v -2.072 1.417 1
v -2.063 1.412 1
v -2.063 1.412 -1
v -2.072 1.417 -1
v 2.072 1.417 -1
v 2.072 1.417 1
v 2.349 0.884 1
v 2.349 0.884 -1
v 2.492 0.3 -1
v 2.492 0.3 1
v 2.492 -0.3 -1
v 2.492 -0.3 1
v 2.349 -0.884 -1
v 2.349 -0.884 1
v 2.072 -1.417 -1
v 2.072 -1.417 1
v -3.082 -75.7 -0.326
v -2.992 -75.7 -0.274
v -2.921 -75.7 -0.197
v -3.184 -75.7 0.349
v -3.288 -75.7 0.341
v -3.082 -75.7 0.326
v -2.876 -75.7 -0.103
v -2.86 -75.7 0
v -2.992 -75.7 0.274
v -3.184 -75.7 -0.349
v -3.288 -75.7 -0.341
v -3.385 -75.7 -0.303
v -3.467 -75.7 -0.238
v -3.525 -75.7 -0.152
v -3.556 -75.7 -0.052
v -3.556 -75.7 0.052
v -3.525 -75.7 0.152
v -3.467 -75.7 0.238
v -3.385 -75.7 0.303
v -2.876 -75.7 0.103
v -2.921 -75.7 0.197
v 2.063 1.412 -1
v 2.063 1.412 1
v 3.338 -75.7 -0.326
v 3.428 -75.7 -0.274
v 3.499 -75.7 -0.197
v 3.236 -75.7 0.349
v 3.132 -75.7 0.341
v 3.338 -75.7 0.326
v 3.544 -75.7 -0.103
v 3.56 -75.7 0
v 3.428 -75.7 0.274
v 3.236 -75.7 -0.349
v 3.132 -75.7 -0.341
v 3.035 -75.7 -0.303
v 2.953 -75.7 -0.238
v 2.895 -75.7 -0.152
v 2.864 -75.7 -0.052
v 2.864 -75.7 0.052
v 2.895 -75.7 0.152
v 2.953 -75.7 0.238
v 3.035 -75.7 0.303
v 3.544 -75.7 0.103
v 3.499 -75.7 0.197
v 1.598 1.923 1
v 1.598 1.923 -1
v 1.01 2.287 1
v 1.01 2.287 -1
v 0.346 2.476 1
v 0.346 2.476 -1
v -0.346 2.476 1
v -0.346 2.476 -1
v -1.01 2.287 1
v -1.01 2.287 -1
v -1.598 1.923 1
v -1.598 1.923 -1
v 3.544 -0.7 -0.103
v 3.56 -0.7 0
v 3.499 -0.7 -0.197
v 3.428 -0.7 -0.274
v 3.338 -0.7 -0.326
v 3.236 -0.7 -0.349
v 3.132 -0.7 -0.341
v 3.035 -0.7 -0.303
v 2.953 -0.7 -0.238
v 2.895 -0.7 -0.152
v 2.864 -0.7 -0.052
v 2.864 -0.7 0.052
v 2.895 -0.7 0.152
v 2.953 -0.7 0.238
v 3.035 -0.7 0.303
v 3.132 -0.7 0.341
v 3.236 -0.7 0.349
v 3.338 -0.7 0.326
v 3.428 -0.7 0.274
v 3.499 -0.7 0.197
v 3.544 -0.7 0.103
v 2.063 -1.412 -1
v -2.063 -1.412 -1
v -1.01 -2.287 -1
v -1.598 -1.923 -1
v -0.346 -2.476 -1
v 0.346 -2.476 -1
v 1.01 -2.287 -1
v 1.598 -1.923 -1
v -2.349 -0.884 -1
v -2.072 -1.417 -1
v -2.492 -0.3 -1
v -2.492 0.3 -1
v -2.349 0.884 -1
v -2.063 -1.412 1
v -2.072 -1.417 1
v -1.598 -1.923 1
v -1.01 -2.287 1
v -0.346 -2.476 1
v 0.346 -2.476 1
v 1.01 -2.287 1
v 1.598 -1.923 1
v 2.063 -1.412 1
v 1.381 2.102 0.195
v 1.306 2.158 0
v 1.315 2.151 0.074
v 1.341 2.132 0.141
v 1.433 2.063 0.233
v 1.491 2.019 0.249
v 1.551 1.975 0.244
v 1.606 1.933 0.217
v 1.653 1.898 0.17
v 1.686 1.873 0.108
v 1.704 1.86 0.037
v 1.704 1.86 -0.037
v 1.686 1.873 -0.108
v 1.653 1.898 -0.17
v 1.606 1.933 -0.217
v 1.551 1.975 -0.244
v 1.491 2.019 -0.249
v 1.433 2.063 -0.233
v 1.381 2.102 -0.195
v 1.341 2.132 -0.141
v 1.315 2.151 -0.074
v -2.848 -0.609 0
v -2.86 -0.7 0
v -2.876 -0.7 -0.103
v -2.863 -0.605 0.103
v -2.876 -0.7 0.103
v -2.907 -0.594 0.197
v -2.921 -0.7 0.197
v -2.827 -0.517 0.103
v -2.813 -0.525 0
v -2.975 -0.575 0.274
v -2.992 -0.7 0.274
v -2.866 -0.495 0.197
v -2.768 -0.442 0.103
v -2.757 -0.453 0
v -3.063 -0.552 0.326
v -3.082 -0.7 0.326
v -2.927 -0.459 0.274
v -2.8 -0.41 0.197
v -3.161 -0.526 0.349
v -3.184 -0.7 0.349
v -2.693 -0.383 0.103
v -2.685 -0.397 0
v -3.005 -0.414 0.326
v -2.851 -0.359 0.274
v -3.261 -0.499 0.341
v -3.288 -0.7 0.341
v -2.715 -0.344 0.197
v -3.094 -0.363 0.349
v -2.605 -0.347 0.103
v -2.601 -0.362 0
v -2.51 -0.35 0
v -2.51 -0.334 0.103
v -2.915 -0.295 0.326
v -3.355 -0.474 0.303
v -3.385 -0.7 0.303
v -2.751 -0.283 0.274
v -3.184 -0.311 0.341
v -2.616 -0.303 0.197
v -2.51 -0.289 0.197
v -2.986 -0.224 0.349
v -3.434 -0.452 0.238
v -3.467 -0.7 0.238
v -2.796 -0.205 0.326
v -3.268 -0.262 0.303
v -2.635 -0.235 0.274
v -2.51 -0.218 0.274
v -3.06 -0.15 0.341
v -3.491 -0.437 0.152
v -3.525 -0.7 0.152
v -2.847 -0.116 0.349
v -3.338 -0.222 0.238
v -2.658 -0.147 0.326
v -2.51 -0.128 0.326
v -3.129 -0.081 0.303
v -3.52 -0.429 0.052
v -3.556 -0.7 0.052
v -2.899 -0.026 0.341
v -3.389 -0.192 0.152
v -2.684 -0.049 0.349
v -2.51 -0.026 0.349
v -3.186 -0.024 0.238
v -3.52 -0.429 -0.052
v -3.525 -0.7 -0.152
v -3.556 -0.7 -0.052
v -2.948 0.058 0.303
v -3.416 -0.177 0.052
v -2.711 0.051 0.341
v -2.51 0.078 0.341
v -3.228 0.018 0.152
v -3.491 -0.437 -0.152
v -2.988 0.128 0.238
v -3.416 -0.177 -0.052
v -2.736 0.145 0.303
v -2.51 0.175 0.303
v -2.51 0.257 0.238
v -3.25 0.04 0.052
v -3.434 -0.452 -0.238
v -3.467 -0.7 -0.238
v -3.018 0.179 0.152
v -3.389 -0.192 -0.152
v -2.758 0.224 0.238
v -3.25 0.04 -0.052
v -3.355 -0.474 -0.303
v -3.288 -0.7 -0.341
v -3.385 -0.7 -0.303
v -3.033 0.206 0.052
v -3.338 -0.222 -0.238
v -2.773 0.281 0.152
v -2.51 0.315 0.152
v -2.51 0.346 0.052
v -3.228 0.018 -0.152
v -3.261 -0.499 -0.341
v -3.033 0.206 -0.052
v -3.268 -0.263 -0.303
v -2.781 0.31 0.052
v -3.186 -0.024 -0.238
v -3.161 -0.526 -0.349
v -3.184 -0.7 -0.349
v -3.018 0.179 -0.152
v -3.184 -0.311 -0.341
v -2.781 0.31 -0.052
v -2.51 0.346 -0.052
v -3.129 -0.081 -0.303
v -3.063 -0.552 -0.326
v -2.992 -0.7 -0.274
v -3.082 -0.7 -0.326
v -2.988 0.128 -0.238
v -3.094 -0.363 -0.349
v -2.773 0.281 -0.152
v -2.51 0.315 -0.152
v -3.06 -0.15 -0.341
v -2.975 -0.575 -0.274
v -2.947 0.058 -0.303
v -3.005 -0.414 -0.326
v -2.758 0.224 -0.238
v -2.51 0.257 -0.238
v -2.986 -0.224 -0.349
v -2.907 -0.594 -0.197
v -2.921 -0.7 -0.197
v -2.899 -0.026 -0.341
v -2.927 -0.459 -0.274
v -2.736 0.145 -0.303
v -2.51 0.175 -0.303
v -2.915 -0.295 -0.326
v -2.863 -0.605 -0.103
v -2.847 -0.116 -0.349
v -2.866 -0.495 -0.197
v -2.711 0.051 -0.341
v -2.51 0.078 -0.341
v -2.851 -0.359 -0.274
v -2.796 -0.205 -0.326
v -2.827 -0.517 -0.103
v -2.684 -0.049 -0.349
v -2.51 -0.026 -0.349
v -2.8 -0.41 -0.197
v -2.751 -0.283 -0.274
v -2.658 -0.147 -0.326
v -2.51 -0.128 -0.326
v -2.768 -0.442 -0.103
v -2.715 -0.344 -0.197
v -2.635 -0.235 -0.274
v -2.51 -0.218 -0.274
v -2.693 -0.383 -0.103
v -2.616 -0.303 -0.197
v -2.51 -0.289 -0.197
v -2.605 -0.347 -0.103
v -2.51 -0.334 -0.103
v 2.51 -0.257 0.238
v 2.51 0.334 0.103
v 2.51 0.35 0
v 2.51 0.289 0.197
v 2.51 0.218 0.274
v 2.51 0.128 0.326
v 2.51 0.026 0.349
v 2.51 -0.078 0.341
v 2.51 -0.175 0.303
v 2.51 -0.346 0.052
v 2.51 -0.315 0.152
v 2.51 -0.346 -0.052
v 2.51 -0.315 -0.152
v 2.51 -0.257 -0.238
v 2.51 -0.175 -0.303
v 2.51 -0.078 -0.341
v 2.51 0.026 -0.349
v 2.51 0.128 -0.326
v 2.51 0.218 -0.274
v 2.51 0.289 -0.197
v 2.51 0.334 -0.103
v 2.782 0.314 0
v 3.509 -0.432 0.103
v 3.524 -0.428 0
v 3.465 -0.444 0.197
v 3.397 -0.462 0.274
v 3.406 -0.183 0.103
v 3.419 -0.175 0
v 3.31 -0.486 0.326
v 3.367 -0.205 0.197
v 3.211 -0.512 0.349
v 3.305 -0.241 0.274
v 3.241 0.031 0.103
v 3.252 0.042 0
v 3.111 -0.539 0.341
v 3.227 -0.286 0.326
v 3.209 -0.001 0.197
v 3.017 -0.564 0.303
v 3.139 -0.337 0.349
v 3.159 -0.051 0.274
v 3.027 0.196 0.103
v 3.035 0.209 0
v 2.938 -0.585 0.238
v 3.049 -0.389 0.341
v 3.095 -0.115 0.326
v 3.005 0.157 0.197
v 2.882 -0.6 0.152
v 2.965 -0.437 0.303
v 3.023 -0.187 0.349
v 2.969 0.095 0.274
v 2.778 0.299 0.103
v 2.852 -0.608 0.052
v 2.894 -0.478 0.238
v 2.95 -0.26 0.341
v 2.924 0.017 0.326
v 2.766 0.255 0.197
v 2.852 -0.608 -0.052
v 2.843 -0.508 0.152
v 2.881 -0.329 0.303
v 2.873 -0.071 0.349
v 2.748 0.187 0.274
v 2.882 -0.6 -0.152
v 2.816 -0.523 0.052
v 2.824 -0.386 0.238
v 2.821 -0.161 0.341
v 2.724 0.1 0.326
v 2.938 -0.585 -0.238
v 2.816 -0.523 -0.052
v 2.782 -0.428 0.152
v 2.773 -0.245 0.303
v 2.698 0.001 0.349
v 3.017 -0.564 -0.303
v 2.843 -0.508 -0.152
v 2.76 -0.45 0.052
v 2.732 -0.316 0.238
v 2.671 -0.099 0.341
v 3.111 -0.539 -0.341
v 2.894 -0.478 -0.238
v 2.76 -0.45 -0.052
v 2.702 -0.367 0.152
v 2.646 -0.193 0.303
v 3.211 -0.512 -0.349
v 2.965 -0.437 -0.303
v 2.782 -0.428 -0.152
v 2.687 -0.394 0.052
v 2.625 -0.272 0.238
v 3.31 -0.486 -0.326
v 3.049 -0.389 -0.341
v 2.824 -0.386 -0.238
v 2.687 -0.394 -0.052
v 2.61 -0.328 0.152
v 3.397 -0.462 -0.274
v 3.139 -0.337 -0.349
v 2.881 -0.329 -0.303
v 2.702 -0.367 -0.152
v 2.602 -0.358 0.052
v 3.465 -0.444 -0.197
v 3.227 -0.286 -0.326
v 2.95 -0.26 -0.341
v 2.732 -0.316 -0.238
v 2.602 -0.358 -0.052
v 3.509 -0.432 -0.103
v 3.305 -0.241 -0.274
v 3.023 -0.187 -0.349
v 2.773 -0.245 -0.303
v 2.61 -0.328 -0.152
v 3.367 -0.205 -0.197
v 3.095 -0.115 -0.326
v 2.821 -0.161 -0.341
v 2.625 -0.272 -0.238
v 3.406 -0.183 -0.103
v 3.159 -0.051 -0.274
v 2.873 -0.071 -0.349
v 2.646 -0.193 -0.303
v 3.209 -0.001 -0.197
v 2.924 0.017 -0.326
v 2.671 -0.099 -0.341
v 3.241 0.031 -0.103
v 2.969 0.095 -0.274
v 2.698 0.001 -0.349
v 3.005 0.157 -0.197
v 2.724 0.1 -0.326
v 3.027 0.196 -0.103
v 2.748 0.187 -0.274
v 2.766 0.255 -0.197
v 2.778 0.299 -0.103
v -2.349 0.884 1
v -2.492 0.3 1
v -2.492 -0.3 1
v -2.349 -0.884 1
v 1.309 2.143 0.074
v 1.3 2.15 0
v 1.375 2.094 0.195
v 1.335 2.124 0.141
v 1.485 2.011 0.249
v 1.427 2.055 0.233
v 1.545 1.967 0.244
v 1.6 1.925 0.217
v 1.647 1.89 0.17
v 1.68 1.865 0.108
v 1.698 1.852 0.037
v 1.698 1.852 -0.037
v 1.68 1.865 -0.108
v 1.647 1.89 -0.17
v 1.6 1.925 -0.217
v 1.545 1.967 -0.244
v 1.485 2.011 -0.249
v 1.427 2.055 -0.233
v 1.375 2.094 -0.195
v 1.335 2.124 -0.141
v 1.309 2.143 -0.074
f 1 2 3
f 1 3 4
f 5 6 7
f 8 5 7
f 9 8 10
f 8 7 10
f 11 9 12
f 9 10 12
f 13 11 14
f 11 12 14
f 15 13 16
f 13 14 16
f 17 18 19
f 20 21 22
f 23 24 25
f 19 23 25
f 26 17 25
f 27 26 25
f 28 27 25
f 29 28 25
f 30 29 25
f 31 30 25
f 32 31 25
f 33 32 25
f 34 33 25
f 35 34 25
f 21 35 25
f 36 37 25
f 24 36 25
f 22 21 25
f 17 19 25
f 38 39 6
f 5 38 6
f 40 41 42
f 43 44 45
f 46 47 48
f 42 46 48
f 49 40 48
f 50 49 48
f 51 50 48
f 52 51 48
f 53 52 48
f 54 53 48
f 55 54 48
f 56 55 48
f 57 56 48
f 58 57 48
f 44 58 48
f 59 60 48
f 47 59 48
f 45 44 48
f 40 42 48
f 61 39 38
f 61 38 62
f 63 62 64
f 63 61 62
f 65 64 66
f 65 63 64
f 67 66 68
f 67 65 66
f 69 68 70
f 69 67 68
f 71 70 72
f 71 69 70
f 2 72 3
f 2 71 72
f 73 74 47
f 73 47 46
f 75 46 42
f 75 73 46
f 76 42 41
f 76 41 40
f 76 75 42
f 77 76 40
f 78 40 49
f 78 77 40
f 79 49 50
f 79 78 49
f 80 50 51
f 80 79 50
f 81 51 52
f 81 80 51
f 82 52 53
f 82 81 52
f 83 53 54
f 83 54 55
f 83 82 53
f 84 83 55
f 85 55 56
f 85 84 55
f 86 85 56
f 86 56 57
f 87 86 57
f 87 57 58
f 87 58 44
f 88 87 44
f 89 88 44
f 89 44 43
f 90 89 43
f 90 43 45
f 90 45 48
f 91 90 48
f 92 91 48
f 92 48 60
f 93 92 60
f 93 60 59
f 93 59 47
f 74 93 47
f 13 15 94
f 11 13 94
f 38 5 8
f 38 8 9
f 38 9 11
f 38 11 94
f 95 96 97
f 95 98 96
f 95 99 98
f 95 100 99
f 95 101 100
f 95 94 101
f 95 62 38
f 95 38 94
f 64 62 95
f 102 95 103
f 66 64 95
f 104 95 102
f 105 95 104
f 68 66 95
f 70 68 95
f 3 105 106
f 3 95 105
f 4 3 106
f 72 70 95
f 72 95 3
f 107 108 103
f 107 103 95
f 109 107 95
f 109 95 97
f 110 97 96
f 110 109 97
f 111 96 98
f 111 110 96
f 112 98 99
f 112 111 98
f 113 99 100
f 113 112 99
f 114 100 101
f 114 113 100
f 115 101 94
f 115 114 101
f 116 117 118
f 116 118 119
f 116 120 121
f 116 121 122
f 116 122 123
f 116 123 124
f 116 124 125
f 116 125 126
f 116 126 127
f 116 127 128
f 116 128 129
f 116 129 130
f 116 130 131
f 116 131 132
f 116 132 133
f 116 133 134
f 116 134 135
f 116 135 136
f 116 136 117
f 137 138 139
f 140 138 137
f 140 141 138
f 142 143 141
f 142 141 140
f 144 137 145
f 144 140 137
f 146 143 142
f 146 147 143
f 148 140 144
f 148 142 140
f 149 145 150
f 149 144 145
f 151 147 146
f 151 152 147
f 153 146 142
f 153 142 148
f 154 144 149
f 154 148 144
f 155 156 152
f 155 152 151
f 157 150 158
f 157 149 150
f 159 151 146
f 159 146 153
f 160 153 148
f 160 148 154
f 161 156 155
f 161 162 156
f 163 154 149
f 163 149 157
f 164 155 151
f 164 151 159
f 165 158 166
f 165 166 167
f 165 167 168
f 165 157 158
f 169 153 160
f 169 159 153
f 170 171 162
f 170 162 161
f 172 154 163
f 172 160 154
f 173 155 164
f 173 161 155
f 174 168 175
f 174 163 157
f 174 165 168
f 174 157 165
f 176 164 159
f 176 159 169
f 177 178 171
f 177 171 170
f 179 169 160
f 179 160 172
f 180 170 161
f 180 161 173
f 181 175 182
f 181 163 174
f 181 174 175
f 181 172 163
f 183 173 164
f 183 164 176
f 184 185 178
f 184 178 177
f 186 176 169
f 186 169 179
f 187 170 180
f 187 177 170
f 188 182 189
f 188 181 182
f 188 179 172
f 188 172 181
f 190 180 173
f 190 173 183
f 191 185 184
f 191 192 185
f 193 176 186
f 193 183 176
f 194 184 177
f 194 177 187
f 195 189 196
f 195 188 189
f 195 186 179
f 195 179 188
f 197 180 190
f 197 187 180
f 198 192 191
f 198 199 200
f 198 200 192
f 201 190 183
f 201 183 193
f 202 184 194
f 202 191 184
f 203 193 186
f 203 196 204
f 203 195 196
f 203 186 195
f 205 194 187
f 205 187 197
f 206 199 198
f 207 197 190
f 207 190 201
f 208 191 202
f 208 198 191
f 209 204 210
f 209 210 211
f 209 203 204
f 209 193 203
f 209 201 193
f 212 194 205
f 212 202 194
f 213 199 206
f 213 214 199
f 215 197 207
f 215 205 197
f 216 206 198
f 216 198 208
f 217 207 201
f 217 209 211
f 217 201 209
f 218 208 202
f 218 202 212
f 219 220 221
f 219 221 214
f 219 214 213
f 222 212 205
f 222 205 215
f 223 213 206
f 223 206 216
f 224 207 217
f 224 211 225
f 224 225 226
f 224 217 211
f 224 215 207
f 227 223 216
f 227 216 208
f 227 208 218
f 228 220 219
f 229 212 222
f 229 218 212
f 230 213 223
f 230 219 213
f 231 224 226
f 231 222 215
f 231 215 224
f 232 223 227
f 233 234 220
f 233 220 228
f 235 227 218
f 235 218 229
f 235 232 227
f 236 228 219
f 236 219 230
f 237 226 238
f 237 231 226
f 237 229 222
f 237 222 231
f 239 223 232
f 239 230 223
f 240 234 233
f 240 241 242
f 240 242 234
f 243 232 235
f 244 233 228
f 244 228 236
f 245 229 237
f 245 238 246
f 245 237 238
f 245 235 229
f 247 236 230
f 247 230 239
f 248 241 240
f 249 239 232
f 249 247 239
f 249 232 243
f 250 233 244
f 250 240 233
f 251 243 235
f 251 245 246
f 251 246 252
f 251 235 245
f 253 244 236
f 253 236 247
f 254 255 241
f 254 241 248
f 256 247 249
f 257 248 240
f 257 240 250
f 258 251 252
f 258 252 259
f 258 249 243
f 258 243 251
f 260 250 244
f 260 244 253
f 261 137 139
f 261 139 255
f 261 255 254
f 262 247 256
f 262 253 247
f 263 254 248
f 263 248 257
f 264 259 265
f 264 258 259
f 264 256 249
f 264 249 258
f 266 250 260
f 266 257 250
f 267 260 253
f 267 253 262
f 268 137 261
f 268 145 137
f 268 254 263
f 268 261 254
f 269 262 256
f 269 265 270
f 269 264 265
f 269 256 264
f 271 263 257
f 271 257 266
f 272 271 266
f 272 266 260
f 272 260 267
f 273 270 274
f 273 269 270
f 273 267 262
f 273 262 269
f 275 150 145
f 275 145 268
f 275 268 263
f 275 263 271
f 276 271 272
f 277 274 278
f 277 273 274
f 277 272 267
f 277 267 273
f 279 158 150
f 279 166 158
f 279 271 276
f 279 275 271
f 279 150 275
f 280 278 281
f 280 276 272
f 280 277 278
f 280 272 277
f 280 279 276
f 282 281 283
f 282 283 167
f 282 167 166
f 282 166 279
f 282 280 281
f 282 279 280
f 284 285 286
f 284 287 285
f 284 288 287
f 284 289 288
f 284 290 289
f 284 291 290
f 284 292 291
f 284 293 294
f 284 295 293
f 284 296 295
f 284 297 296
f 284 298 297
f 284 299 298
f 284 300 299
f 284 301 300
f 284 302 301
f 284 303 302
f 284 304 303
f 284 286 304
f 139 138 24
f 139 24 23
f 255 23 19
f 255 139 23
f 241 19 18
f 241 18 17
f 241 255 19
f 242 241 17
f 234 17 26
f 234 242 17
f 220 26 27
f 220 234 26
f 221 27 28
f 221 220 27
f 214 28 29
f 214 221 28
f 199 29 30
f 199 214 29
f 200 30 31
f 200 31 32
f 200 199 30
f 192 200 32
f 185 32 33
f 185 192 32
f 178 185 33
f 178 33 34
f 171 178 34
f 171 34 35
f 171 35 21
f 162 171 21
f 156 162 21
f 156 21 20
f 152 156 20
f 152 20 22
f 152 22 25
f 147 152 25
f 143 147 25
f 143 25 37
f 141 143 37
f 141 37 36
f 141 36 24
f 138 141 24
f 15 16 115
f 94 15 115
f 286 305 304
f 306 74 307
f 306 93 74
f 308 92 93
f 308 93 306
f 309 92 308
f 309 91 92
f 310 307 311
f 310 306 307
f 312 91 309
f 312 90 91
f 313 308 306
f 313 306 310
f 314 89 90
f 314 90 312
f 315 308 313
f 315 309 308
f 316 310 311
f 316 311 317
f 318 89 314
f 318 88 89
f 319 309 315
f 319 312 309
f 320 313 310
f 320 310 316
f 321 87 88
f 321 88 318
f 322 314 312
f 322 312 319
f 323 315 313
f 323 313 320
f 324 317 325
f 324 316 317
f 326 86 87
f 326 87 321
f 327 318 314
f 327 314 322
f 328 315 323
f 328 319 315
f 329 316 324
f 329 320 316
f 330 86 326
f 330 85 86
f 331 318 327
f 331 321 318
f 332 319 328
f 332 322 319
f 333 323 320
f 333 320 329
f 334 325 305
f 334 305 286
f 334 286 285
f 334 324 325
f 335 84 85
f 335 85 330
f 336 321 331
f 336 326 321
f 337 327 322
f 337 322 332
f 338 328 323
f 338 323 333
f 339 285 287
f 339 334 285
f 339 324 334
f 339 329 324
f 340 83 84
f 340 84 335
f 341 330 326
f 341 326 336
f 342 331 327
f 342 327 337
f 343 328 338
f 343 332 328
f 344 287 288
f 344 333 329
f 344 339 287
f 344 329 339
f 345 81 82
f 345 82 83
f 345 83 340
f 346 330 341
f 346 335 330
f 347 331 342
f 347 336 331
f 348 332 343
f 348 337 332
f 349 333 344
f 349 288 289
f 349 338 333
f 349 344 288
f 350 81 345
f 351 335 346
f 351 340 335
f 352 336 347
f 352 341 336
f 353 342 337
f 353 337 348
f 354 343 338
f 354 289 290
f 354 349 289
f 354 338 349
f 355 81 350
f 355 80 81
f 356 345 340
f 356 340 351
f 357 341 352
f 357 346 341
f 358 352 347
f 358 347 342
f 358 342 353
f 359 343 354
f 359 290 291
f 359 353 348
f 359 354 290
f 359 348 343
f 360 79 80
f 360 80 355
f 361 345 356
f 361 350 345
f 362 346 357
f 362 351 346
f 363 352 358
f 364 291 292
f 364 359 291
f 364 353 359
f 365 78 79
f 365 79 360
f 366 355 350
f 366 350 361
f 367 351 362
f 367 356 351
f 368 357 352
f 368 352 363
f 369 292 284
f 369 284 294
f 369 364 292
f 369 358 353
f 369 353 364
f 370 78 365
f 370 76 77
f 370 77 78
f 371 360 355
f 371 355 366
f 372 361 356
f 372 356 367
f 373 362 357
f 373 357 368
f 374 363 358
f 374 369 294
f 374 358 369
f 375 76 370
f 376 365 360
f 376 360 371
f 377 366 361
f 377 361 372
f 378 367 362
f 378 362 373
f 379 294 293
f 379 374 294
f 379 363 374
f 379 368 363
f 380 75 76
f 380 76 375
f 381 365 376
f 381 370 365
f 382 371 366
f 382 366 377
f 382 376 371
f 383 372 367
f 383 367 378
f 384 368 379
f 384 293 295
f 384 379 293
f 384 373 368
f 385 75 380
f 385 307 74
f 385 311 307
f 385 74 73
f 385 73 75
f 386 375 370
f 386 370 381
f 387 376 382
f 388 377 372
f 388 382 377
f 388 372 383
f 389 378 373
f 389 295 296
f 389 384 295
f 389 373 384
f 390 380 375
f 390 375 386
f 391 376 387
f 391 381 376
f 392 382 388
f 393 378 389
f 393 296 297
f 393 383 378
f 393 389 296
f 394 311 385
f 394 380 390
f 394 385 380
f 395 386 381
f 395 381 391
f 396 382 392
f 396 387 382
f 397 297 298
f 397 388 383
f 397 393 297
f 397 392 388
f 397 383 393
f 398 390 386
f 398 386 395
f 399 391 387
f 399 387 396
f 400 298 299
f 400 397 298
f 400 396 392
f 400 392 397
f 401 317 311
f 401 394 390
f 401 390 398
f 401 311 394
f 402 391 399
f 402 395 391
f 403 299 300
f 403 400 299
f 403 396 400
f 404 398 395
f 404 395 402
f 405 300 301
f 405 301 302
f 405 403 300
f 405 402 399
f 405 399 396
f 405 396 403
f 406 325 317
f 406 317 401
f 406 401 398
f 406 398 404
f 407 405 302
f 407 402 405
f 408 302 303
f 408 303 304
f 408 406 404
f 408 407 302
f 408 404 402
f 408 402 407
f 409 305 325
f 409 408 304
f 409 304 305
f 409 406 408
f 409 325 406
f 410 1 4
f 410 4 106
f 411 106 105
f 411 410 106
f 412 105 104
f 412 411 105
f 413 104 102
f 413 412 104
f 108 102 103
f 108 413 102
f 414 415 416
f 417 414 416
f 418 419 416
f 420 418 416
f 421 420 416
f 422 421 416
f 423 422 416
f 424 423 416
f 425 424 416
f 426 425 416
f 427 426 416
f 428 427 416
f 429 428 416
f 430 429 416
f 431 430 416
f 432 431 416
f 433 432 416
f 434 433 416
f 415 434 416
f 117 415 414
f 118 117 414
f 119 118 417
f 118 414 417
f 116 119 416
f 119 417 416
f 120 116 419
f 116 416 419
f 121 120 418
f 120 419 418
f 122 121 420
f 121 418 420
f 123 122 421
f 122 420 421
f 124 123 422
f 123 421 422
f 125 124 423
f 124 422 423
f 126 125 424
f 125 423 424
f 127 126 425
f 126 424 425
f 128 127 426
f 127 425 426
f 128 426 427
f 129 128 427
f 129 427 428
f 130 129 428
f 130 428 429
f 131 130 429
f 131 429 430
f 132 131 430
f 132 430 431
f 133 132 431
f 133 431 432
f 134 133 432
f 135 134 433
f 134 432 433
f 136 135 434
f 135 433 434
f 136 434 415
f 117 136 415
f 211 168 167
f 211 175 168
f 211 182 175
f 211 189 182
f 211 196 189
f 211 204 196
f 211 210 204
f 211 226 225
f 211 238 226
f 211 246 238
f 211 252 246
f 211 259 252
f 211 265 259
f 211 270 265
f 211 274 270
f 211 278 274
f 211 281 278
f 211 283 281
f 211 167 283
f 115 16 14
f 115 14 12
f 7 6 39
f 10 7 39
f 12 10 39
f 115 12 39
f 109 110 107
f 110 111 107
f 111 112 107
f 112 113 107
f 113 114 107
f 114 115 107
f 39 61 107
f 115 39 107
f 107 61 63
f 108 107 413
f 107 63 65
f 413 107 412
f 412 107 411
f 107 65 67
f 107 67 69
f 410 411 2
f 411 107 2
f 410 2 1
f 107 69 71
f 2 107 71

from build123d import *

# Parameters (mm, degrees)
SKETCH1_R           = 2.5
BOSS_EXTRUDE3_DEPTH = 1
BOSS_EXTRUDE4_DEPTH = 2
SKETCH12_4_R        = 0.25
BOSS_EXTRUDE5_DEPTH = 0.01
SWEEP20_PROFILE_R   = 0.35
SWEEP21_PROFILE_R   = 0.35


with BuildPart() as part:
    # Sketch1 → Boss-Extrude3 (new body, symmetric)
    with BuildSketch(Plane.XY):
        Circle(SKETCH1_R)
    extrude(amount=BOSS_EXTRUDE3_DEPTH, both=True)

    # Sketch2 → Boss-Extrude4 (add)
    with BuildSketch(Plane.XY.offset(1)):
        with BuildLine():
            Line((2.063339037, 1.411606183), (2.071592393, 1.417252608))
            ThreePointArc((2.071592393, 1.417252608), (2.51, 0), (2.071592393, -1.417252608))
            Line((2.071592393, -1.417252608), (2.063339037, -1.411606183))
            ThreePointArc((2.063339037, -1.411606183), (2.5, 0), (2.063339037, 1.411606183))
        make_face()
    boss_extrude4 = extrude(amount=-BOSS_EXTRUDE4_DEPTH)

    # Mirror1: Boss-Extrude4 across plane
    add(boss_extrude4.mirror(Plane(origin=(0, 0, 0), x_dir=(0, 0, 1), z_dir=(1, 0, 0))))


with BuildPart() as body_2:
    # Sketch12_4 → Boss-Extrude5 (new body)
    with BuildSketch(Plane(origin=(1.5, 2, 0), x_dir=(0.8, -0.6, 0), z_dir=(0.6, 0.8, 0))):
        with Locations(Location((0, 0, 0), (0, 0, 180))):  # turned: the seam where the file's is
            Circle(SKETCH12_4_R)
    extrude(amount=BOSS_EXTRUDE5_DEPTH)


with BuildPart() as body_3:
    # Sweep20: sweep along a path in Sketch14
    with BuildLine(Plane.XY) as sweep20_path:
        Line((3.21, -75.7), (3.21, -0.7))
        ThreePointArc((3.21, -0.7), (3.004974747, -0.205025253), (2.51, 0))
    # Sweep20 profile (on start of the path) → Sweep20 (sweep)
    with BuildSketch(Plane(origin=(3.21, -75.7, 0), x_dir=(1, 0, 0), z_dir=(0, 1, 0))):
        Circle(SWEEP20_PROFILE_R)
    sweep(path=sweep20_path.line)


with BuildPart() as body_4:
    # Sweep21: sweep along a path in Sketch157
    with BuildLine(Plane(origin=(0, 0, 0), x_dir=(-1, 0, 0), z_dir=(0, 0, -1))) as sweep21_path:
        Line((3.21, -75.7), (3.21, -0.7))
        ThreePointArc((3.21, -0.7), (3.004974747, -0.205025253), (2.51, 0))
    # Sweep21 profile (on start of the path) → Sweep21 (sweep)
    with BuildSketch(Plane(origin=(-3.21, -75.7, 0), x_dir=(1, 0, 0), z_dir=(0, 1, 0))):
        Circle(SWEEP21_PROFILE_R)
    sweep(path=sweep21_path.line)


solid = Compound([part.part, body_2.part, body_3.part, body_4.part])
